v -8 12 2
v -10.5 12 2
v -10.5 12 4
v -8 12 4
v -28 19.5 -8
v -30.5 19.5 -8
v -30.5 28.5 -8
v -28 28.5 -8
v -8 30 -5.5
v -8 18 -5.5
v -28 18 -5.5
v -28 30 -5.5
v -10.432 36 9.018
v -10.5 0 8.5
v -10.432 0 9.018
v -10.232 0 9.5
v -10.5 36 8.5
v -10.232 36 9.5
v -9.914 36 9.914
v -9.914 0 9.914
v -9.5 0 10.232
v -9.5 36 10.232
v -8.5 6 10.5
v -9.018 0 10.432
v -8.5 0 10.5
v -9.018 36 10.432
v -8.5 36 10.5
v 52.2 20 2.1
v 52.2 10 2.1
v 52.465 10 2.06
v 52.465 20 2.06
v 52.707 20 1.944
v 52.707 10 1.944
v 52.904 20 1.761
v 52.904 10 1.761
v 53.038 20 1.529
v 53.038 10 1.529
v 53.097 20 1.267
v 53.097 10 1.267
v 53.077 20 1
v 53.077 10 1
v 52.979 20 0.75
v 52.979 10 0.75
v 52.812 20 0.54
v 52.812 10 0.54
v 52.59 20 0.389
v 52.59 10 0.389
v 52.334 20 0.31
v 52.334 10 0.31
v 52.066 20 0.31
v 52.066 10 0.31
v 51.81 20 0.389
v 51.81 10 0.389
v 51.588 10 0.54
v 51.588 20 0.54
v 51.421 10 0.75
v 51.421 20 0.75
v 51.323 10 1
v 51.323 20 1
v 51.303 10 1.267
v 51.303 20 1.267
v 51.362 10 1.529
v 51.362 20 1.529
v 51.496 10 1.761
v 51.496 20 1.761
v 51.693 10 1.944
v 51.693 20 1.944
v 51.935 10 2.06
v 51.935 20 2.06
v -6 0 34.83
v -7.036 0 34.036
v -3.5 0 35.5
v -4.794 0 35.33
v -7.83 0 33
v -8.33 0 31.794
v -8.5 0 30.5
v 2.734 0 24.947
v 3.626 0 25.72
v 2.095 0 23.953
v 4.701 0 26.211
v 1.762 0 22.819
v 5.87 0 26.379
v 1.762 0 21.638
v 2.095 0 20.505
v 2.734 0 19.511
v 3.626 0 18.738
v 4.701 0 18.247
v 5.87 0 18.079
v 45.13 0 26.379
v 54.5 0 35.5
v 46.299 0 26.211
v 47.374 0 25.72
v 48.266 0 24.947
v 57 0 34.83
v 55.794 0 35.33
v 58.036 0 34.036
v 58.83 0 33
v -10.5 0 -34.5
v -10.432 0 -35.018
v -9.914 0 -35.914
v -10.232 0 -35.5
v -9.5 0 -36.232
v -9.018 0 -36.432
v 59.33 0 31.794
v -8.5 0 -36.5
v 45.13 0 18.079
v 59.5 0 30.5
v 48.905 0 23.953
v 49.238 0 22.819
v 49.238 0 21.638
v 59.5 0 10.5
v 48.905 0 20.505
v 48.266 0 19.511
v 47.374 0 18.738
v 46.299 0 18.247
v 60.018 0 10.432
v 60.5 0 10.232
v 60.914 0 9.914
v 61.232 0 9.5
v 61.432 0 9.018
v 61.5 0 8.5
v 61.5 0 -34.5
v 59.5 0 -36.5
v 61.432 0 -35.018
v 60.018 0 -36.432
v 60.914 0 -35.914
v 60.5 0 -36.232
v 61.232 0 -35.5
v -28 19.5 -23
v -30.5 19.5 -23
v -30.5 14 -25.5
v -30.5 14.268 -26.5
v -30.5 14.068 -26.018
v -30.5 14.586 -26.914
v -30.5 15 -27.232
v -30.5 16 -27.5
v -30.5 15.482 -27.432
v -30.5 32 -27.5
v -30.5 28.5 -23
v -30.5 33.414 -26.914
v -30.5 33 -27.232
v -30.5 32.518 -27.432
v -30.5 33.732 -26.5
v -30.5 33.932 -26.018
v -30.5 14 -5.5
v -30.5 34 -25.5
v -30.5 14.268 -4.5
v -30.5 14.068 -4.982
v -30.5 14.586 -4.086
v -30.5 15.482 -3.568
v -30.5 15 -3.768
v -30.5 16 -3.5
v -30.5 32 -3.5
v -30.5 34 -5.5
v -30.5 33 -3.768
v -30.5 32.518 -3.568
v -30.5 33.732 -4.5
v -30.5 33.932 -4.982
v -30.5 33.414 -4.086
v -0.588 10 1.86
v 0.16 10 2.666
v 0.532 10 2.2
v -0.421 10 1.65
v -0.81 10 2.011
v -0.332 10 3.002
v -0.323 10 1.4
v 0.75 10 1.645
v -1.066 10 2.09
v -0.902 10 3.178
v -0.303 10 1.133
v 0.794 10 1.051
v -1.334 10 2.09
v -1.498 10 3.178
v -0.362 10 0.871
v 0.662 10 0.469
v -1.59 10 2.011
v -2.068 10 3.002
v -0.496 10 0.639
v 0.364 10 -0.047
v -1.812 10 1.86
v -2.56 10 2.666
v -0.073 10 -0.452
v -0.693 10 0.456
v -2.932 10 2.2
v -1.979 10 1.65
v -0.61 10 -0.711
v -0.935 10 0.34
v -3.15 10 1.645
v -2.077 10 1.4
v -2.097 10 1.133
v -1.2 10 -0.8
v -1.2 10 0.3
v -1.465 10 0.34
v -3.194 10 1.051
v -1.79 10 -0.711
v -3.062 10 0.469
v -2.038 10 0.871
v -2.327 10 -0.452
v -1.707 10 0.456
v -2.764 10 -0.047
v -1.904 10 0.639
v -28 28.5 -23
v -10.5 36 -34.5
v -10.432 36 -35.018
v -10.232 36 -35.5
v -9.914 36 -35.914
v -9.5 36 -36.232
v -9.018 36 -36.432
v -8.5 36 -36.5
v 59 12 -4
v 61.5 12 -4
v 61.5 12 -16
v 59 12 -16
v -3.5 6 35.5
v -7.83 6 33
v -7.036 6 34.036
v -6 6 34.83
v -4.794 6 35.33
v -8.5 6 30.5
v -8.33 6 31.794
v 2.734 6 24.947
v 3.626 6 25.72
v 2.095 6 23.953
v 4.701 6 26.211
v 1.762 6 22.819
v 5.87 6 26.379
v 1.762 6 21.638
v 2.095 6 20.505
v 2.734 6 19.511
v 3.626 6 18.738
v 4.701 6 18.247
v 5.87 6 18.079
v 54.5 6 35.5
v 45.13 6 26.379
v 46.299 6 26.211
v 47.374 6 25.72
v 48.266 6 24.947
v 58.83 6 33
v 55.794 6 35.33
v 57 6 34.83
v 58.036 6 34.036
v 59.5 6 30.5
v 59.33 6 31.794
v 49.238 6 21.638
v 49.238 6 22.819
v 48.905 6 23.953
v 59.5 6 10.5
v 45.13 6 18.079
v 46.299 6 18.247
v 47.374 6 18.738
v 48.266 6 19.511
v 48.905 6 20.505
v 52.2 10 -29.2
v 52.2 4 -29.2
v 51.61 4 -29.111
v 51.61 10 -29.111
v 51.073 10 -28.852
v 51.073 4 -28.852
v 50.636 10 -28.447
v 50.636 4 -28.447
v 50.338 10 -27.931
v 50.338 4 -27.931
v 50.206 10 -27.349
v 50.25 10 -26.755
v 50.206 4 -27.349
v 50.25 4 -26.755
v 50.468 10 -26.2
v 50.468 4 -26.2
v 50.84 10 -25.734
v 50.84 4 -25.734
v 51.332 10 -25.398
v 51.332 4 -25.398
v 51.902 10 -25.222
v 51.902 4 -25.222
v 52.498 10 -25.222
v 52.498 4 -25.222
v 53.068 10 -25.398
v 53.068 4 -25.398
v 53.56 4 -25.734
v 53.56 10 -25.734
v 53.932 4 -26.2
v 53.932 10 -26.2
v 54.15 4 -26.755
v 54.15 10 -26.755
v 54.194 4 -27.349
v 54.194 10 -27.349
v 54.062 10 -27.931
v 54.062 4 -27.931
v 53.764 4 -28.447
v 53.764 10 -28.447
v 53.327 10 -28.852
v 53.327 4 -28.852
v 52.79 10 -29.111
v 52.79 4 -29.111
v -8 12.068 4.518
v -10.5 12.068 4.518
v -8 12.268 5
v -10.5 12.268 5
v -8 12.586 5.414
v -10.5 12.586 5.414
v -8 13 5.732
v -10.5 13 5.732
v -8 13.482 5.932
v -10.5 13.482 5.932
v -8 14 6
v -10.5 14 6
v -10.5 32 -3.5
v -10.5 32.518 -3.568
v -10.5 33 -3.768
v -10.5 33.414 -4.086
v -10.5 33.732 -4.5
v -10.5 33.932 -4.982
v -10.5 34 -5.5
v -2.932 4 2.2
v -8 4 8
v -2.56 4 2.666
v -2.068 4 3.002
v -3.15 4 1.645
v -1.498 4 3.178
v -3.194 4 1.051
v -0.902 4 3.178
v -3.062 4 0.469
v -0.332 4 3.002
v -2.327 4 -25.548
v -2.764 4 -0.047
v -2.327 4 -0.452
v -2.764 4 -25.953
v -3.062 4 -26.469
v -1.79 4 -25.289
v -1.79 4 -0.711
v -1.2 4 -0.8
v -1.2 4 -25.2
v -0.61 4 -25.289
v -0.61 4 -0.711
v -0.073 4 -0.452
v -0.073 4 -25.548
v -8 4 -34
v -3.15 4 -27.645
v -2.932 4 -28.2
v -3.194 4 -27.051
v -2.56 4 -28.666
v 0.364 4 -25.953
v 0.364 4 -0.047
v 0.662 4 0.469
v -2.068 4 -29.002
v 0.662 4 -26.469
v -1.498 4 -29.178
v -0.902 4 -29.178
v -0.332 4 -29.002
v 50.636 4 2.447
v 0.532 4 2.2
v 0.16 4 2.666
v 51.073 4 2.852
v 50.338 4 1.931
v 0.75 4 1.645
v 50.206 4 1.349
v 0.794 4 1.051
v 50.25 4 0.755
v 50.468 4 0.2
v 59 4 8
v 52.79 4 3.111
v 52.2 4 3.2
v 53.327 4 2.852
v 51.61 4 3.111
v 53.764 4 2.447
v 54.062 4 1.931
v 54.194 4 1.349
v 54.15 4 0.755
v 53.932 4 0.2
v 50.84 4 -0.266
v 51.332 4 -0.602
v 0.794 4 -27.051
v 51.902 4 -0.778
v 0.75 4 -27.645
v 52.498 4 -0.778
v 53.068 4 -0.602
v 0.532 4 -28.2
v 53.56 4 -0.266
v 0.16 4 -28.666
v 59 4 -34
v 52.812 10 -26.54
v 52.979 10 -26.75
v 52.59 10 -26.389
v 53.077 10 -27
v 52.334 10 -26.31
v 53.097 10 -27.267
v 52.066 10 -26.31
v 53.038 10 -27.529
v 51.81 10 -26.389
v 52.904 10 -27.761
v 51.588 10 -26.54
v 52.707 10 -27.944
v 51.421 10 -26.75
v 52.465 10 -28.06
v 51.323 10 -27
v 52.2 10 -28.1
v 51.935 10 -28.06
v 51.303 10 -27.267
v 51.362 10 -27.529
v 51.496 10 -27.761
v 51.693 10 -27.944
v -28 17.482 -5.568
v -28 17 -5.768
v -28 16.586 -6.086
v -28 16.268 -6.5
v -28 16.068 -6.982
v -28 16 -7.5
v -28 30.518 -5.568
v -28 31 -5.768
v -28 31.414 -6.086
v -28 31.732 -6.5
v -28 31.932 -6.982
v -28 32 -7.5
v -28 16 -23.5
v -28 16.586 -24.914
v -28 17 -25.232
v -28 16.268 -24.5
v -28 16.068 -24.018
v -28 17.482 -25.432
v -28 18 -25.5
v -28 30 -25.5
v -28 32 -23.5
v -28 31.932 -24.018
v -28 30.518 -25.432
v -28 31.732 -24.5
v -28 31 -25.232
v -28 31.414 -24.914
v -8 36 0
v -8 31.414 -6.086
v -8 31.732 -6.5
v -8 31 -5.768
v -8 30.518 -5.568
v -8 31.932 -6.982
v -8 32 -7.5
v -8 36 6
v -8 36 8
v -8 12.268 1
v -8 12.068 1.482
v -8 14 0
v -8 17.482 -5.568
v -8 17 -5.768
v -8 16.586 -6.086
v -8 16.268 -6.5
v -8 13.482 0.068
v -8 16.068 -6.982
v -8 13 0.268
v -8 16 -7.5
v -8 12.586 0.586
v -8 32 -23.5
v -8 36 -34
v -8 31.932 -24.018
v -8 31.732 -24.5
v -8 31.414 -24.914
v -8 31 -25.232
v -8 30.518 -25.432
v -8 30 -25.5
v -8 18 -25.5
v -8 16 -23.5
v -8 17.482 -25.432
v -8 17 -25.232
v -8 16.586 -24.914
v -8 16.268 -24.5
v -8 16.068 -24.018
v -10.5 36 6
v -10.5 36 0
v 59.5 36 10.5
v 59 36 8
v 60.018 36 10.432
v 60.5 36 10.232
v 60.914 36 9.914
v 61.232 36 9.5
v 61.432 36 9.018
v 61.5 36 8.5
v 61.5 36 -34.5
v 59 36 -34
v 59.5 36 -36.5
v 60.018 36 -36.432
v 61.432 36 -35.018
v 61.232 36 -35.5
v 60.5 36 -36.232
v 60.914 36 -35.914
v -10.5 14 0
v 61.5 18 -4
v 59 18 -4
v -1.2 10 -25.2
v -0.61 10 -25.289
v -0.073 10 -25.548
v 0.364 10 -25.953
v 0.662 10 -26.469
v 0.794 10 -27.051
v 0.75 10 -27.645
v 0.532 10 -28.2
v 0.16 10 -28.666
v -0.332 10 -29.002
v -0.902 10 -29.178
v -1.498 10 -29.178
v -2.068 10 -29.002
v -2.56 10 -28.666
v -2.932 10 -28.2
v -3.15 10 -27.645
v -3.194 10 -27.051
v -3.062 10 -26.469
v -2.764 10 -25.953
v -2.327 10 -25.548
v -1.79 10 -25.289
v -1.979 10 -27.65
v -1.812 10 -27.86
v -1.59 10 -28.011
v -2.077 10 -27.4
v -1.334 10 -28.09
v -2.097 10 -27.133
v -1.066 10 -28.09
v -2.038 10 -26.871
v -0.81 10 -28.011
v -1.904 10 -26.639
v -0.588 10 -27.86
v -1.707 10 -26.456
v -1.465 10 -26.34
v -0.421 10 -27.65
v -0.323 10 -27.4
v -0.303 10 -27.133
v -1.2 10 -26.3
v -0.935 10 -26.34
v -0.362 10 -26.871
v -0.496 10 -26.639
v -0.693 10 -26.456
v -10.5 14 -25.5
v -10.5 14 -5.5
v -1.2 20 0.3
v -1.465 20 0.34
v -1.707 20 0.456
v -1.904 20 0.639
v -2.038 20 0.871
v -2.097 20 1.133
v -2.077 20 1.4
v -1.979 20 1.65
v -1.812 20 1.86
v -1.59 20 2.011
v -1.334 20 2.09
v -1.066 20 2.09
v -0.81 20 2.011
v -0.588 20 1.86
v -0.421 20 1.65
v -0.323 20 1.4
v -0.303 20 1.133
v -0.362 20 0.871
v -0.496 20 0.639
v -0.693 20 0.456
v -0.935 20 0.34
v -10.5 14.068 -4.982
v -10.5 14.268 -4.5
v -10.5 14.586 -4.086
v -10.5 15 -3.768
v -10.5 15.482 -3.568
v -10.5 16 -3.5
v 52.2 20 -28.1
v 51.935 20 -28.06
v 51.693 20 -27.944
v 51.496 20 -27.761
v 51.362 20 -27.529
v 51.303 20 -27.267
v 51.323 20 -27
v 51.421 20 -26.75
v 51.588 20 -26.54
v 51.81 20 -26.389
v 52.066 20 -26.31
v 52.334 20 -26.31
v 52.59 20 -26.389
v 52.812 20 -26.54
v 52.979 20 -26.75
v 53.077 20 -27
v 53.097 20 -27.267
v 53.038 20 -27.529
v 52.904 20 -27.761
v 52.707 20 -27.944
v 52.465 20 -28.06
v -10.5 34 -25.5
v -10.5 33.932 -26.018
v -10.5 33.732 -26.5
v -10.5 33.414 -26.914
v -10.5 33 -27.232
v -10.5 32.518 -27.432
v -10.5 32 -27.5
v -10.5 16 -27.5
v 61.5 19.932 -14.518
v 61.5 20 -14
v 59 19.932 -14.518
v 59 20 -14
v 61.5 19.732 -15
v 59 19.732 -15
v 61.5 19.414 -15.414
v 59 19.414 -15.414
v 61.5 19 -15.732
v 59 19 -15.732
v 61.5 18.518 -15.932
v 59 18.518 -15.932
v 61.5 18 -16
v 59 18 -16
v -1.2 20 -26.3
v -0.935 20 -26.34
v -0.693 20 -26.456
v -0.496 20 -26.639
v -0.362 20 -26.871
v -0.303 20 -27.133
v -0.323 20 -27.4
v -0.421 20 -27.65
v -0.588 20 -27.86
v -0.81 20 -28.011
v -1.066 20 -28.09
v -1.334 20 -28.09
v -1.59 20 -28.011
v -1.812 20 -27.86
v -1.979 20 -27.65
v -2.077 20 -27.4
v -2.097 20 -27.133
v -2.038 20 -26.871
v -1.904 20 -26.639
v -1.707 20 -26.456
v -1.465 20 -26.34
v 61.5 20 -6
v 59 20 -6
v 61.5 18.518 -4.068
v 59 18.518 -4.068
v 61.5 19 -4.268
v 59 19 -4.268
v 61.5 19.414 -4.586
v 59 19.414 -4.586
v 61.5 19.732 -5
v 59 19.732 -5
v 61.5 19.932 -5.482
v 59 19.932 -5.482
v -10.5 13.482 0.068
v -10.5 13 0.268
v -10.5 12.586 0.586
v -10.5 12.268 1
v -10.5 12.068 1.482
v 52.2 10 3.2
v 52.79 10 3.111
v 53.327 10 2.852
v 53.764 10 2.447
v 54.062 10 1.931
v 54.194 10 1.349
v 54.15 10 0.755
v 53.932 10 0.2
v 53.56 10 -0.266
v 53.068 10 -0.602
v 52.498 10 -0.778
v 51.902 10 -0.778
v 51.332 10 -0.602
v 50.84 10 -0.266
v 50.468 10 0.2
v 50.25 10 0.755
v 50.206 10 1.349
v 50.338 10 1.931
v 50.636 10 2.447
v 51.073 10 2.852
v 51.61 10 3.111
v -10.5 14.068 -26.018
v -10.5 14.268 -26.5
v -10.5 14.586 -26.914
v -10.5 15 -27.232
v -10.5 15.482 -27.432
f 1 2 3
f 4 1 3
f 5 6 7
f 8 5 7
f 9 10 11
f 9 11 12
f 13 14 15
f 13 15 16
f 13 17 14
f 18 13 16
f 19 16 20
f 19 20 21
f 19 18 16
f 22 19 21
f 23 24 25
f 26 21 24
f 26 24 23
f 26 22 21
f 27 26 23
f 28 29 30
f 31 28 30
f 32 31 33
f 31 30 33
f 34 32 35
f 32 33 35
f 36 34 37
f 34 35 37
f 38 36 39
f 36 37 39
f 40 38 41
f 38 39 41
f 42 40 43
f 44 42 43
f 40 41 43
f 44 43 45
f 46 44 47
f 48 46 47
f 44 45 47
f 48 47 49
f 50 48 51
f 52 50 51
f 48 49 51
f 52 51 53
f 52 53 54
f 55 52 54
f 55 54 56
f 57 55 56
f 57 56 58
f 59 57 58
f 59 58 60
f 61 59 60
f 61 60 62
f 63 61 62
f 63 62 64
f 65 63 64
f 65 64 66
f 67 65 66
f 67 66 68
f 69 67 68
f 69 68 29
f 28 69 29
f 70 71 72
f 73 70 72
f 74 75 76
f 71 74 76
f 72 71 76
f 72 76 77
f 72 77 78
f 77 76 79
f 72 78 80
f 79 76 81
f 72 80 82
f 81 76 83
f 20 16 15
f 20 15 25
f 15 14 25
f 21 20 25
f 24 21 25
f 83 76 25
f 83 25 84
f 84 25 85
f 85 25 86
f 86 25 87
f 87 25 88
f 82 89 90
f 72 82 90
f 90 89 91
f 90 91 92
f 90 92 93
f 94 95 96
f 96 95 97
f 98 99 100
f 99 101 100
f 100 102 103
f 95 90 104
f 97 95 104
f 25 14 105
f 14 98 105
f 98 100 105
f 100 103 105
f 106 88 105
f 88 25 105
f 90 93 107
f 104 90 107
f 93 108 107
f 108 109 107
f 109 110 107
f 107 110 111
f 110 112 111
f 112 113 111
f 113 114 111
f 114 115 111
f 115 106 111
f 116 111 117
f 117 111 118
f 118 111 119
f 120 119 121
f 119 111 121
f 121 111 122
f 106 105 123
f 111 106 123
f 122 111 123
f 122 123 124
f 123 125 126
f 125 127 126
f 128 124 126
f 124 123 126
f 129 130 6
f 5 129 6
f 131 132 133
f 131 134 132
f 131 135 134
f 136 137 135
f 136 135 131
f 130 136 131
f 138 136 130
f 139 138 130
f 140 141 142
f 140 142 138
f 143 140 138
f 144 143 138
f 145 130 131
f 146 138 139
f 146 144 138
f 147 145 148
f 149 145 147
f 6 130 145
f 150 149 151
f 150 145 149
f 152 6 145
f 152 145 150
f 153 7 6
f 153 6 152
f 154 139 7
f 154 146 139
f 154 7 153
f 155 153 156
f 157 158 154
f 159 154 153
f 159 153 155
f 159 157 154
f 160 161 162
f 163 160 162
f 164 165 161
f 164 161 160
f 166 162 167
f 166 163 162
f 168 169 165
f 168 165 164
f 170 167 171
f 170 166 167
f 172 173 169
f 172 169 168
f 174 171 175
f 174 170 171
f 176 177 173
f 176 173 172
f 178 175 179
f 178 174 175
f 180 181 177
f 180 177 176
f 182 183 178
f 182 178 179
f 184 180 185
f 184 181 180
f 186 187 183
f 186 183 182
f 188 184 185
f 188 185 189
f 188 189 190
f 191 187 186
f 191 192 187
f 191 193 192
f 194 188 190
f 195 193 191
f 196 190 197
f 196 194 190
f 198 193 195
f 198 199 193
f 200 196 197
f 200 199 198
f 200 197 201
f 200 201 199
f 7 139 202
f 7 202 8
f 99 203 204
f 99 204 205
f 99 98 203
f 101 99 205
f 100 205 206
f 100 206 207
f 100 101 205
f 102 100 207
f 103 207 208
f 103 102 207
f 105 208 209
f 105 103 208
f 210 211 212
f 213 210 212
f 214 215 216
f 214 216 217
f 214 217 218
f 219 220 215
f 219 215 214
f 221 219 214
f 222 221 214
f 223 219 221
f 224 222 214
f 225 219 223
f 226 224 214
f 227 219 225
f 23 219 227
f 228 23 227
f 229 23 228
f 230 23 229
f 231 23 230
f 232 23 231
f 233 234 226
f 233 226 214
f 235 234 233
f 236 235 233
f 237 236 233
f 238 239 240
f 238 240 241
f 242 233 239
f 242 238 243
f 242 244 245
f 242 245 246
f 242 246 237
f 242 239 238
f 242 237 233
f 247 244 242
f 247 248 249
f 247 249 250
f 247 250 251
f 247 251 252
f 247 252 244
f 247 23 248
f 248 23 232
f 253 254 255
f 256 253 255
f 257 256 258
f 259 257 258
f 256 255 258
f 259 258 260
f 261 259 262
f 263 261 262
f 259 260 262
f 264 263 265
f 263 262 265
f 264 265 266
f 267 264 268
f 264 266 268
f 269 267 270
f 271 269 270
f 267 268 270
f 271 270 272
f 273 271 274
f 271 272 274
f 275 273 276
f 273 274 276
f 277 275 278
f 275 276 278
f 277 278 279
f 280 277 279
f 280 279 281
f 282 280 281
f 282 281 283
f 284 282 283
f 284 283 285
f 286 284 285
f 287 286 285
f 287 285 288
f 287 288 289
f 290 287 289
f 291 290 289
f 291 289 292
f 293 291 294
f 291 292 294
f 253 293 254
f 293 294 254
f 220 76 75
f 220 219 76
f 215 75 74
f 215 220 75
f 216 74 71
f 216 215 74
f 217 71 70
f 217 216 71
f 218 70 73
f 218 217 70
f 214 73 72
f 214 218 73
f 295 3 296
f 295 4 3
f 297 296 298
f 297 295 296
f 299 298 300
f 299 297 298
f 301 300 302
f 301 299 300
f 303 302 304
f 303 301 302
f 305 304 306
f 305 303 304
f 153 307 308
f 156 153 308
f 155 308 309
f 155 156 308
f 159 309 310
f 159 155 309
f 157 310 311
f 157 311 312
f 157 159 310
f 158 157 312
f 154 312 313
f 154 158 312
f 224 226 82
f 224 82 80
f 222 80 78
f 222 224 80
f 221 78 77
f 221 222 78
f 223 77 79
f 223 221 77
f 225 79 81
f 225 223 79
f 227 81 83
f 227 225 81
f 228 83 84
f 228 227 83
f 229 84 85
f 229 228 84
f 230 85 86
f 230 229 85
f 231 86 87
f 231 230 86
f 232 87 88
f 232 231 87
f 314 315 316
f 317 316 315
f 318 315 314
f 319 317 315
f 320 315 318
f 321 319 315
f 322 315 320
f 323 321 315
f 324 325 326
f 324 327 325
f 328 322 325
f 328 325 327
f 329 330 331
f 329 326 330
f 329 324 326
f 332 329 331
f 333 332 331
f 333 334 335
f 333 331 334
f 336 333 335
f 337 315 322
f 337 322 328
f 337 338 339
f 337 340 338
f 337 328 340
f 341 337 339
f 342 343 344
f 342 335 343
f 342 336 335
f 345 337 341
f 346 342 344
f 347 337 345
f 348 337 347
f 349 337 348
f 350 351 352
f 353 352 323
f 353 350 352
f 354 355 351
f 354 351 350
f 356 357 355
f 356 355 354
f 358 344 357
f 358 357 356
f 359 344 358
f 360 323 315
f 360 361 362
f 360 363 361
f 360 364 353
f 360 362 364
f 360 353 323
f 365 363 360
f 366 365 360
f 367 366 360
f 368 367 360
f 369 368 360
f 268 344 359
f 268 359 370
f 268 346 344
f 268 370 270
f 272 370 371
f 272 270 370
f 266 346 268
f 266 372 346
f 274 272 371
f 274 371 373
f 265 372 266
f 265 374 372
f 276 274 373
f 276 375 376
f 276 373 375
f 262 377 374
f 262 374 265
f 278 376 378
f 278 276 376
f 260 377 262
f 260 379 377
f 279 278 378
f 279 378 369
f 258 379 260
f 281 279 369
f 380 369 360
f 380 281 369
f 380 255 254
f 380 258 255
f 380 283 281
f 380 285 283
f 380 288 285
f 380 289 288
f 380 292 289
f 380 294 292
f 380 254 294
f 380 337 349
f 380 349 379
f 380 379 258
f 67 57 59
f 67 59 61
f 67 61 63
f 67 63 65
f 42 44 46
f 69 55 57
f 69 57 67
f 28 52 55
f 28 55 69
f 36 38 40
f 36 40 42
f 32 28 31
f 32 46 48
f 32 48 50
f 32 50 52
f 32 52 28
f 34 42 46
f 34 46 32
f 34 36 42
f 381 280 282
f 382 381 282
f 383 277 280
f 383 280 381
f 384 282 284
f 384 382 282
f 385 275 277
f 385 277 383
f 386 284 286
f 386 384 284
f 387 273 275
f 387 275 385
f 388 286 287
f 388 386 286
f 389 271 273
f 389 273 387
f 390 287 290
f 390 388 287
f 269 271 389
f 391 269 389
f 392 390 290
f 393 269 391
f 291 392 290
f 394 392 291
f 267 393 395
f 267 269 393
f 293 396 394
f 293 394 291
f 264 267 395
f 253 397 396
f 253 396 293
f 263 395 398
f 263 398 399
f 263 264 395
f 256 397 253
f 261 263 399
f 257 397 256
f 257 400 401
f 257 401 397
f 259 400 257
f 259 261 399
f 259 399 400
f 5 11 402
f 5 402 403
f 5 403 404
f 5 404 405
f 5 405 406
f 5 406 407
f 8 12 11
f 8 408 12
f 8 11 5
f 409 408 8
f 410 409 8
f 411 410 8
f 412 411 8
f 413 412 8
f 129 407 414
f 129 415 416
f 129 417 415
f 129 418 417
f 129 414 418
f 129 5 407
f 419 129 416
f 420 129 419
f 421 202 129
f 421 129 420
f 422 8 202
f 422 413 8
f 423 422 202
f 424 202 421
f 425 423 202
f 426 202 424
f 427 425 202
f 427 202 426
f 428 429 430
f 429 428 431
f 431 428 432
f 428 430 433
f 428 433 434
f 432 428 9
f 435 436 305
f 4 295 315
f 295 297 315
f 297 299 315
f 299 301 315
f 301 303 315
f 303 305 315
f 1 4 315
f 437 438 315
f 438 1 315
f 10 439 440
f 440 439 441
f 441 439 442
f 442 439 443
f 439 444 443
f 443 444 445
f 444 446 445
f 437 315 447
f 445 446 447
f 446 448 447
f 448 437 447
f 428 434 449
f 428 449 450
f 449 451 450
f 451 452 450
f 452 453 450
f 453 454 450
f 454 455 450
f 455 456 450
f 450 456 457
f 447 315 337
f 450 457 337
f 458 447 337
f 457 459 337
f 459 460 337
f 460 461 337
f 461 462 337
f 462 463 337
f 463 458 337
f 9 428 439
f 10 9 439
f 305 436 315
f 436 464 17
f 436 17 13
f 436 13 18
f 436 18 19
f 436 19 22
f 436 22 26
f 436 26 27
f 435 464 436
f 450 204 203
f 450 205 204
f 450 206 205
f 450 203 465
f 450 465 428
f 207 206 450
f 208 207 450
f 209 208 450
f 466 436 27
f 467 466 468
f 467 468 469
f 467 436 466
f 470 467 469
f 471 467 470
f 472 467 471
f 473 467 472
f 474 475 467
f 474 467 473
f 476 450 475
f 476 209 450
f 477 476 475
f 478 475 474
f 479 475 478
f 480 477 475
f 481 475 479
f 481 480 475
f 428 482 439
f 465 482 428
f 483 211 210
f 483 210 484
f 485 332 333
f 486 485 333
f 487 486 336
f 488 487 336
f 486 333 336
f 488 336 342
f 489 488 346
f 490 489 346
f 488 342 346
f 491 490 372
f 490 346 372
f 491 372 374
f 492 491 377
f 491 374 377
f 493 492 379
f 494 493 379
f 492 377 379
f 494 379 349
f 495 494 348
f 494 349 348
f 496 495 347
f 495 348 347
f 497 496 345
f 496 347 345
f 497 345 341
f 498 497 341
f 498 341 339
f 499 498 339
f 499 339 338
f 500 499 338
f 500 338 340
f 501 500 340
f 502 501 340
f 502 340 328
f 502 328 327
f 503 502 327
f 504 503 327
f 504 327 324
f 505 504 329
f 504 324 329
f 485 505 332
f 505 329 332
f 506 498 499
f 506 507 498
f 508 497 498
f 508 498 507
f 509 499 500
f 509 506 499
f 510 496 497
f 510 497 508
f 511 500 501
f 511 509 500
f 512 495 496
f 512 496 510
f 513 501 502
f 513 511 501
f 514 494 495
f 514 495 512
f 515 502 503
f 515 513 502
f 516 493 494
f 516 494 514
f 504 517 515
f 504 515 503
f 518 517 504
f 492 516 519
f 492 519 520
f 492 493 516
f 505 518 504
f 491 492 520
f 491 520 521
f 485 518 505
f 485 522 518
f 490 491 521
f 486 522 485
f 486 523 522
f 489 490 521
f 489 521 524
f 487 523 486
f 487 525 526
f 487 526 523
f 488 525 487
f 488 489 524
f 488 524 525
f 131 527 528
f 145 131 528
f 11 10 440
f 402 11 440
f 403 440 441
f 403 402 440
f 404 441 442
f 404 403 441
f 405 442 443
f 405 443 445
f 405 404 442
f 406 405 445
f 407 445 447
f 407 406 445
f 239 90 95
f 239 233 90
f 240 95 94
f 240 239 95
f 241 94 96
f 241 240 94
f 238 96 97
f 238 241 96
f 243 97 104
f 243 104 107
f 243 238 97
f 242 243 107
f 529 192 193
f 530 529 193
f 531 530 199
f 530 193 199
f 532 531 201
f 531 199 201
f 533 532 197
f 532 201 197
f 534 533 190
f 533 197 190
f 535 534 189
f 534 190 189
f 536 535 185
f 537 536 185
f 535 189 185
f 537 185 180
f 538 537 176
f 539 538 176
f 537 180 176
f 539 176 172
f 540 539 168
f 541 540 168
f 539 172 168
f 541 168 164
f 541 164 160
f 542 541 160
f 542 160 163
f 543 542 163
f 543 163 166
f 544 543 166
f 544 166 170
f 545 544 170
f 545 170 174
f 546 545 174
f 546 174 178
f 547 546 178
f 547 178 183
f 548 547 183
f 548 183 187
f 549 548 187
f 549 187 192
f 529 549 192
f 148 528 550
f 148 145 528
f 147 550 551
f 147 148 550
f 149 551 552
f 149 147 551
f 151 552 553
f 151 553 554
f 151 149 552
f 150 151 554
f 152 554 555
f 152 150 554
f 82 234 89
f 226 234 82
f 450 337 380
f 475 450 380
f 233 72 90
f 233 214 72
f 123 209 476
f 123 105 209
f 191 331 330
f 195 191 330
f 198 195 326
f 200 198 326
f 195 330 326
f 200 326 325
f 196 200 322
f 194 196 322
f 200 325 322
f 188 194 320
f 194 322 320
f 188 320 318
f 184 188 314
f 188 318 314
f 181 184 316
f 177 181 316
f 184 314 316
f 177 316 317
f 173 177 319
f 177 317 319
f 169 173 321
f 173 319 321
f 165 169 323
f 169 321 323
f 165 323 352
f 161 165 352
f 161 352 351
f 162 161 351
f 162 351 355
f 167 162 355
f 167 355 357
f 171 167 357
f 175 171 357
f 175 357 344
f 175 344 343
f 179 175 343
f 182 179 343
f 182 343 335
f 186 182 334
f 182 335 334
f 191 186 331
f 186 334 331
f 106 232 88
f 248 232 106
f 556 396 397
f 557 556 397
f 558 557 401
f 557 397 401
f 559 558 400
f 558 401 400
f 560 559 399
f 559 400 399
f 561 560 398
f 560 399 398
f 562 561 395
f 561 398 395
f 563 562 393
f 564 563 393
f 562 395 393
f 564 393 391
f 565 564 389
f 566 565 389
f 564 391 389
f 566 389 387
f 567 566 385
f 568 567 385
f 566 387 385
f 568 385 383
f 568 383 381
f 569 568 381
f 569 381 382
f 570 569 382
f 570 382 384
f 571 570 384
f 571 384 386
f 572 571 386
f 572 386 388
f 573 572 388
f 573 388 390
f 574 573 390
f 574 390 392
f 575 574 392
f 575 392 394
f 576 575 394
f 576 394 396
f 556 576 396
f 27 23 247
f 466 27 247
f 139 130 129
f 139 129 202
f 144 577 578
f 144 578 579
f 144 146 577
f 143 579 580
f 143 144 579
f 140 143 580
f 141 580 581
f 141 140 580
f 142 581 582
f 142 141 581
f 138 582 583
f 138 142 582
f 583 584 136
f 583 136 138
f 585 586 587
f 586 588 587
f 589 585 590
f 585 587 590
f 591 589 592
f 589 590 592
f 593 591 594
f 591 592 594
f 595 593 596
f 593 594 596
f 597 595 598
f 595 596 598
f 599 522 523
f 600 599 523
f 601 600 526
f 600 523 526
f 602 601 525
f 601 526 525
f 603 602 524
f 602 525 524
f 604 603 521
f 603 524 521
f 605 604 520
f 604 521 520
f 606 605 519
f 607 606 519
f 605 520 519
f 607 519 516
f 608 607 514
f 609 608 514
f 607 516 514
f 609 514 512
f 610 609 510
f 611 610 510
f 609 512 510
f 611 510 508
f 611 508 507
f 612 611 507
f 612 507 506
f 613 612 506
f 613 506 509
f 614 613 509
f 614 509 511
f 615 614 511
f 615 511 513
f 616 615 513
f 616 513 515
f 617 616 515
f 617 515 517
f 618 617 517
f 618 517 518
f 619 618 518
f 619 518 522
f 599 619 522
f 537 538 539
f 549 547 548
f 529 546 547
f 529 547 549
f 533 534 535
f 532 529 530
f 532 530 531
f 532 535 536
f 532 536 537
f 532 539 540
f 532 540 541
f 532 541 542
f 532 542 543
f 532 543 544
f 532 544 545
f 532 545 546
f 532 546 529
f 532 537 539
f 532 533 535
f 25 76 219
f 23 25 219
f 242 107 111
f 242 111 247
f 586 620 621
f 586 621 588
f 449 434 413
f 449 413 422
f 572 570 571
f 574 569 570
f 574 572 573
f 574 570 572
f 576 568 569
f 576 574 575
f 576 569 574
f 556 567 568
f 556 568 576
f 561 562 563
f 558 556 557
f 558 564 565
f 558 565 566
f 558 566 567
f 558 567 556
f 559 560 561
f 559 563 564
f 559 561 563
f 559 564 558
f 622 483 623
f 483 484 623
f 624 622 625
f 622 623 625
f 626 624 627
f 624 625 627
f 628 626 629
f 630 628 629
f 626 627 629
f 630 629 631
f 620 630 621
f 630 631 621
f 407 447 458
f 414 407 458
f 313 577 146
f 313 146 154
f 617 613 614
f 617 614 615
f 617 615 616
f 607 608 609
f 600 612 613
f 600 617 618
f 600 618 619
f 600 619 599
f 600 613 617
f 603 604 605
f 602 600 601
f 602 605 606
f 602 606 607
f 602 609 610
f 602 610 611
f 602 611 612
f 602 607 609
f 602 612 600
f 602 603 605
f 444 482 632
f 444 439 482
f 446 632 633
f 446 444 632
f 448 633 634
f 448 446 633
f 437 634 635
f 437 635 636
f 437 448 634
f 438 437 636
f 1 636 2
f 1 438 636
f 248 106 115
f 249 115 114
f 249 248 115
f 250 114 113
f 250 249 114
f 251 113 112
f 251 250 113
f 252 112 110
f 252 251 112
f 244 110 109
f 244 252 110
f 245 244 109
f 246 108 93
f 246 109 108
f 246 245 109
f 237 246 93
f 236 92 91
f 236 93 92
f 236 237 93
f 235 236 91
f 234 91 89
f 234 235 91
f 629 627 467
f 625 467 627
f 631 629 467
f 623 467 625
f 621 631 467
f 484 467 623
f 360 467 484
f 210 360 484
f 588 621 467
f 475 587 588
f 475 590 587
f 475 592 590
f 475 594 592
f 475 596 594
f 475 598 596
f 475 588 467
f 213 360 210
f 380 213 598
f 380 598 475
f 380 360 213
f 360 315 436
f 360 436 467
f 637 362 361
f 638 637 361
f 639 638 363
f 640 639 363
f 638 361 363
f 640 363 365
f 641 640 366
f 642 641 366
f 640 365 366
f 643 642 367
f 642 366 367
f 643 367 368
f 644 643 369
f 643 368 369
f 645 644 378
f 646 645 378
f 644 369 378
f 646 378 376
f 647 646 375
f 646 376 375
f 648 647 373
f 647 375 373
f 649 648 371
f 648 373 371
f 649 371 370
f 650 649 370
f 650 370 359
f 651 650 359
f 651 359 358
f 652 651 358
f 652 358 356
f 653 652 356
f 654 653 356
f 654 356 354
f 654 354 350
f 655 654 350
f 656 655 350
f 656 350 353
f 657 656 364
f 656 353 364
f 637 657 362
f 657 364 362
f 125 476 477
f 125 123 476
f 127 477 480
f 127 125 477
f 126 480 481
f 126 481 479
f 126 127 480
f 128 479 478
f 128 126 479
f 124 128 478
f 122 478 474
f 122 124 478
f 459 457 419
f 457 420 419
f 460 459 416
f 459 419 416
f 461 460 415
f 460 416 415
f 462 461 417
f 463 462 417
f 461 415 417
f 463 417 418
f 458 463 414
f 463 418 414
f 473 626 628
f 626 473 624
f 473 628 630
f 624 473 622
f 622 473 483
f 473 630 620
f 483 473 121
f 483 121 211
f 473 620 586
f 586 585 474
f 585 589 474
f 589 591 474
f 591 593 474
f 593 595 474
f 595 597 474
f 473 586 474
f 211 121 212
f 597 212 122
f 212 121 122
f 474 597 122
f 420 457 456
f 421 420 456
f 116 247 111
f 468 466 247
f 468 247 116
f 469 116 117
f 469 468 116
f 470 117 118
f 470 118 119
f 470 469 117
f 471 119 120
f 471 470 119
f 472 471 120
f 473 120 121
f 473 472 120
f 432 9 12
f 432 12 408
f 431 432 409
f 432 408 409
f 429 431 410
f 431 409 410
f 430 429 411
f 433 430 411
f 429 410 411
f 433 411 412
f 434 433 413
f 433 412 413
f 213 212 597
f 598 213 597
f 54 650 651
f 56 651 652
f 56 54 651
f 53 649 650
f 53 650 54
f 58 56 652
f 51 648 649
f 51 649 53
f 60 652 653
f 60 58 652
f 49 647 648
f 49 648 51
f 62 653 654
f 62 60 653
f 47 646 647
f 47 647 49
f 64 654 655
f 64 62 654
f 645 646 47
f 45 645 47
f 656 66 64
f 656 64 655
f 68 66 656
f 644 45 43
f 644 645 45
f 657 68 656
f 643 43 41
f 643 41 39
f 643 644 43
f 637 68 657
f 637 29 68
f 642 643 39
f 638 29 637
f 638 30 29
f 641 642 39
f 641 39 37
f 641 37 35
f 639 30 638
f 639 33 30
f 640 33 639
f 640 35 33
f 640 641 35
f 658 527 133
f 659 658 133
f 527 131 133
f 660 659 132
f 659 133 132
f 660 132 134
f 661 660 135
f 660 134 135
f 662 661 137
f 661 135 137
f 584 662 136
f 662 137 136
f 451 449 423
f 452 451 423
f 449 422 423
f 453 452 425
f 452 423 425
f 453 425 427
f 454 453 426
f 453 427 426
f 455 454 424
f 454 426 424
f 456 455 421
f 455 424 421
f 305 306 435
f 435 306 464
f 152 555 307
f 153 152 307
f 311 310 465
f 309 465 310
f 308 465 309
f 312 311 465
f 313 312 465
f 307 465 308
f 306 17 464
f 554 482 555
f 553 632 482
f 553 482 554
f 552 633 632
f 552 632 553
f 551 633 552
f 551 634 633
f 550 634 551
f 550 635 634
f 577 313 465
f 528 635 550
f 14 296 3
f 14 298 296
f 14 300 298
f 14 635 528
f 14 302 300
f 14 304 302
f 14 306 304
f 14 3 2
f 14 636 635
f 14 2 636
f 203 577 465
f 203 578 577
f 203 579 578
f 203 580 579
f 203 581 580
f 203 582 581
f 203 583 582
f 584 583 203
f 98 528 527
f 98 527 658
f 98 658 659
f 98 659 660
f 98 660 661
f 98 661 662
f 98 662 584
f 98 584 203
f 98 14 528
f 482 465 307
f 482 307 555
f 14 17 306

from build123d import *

# Parameters (mm, degrees)
SKETCH1_W           = 72
SKETCH1_H           = 47
BOSS_EXTRUDE1_DEPTH = 4
SKETCH3_W           = 72
SKETCH3_H           = 47
SKETCH3_W_2         = 67
SKETCH3_H_2         = 42
BOSS_EXTRUDE3_DEPTH = 32
SKETCH2_R           = 0.9
BOSS_EXTRUDE4_DEPTH = 16
SKETCH4_R           = 2
BOSS_EXTRUDE5_DEPTH = 6
SKETCH5_W           = 12
SKETCH5_H           = 8
CUT_EXTRUDE1_DEPTH  = 6
FILLET2_R           = 2
FILLET3_R           = 2
SKETCH11_W          = 24
SKETCH11_H          = 20
BOSS_EXTRUDE7_DEPTH = 20
SKETCH12_W          = 20
SKETCH12_H          = 16
CUT_EXTRUDE4_DEPTH  = 20
SKETCH13_W          = 15
SKETCH13_H          = 9
CUT_EXTRUDE5_DEPTH  = 20
FILLET4_R           = 2
FILLET5_R           = 2
SKETCH14_W          = 6
SKETCH14_H          = 25
CUT_EXTRUDE6_DEPTH  = 5
FILLET6_R           = 2
SKETCH15_W          = 68
SKETCH15_H          = 6
BOSS_EXTRUDE8_DEPTH = 25
FILLET7_R           = 5
CUT_EXTRUDE7_DEPTH  = 25


with BuildPart() as part:
    # Sketch1 → Boss-Extrude1 (new body)
    with BuildSketch(Plane(origin=(0, 0, 0), x_dir=(1, 0, 0), z_dir=(0, 1, 0))):
        with Locations((25.5, 13)):
            Rectangle(SKETCH1_W, SKETCH1_H)
    extrude(amount=BOSS_EXTRUDE1_DEPTH)

    # Sketch3 → Boss-Extrude3 (add)
    with BuildSketch(Plane(origin=(0, 4, 0), x_dir=(1, 0, 0), z_dir=(0, 1, 0))):
        with Locations((25.5, 13)):
            Rectangle(SKETCH3_W, SKETCH3_H)
        with Locations((25.5, 13)):
            Rectangle(SKETCH3_W_2, SKETCH3_H_2, mode=Mode.SUBTRACT)
    extrude(amount=BOSS_EXTRUDE3_DEPTH)

    # Sketch2 → Boss-Extrude4 (add)
    with BuildSketch(Plane(origin=(0, 4, 0), x_dir=(1, 0, 0), z_dir=(0, 1, 0))):
        with Locations(Location((-1.2, 27.2, 0), (0, 0, 270))):
            Circle(SKETCH2_R)
        with Locations(Location((-1.2, -1.2, 0), (0, 0, 90))):
            Circle(SKETCH2_R)
        with Locations(Location((52.2, -1.2, 0), (0, 0, 270))):
            Circle(SKETCH2_R)
        with Locations(Location((52.2, 27.2, 0), (0, 0, 90))):
            Circle(SKETCH2_R)
    extrude(amount=BOSS_EXTRUDE4_DEPTH)

    # Sketch4 → Boss-Extrude5 (add)
    with BuildSketch(Plane(origin=(0, 4, 0), x_dir=(1, 0, 0), z_dir=(0, 1, 0))):
        with Locations(Location((-1.2, 27.2, 0), (0, 0, 270))):
            Circle(SKETCH4_R)
        with Locations(Location((-1.2, -1.2, 0), (0, 0, 90))):
            Circle(SKETCH4_R)
        with Locations(Location((52.2, -1.2, 0), (0, 0, 270))):
            Circle(SKETCH4_R)
        with Locations(Location((52.2, 27.2, 0), (0, 0, 90))):
            Circle(SKETCH4_R)
    extrude(amount=BOSS_EXTRUDE5_DEPTH)

    # Sketch5 → Cut-Extrude1 (cut)
    with BuildSketch(Plane(origin=(61.5, 0, 0), x_dir=(0, 0, -1), z_dir=(1, 0, 0))):
        with Locations((10, 16)):
            Rectangle(SKETCH5_W, SKETCH5_H)
    extrude(amount=-CUT_EXTRUDE1_DEPTH, mode=Mode.SUBTRACT)

    # Fillet2
    fillet2_edges = [part.edges().sort_by_distance(p)[0] for p in [
        (-10.5, 18, 10.5),
        (-10.5, 18, -36.5),
        (61.5, 18, -36.5),
        (61.5, 18, 10.5),
    ]]
    fillet(fillet2_edges, radius=FILLET2_R)

    # Fillet3
    fillet3_edges = [part.edges().sort_by_distance(p)[0] for p in [
        (60.25, 20, -4),
        (60.25, 20, -16),
    ]]
    fillet(fillet3_edges, radius=FILLET3_R)

    # Sketch11 → Boss-Extrude7 (add)
    with BuildSketch(Plane.ZY.offset(10.5)):
        with Locations((-15.5, 24)):
            Rectangle(SKETCH11_W, SKETCH11_H)
    extrude(amount=BOSS_EXTRUDE7_DEPTH)

    # Sketch12 → Cut-Extrude4 (cut)
    with BuildSketch(Plane(origin=(-8, 0, 0), x_dir=(0, 0, -1), z_dir=(1, 0, 0))):
        with Locations((15.5, 24)):
            Rectangle(SKETCH12_W, SKETCH12_H)
    extrude(amount=-CUT_EXTRUDE4_DEPTH, mode=Mode.SUBTRACT)

    # Sketch13 → Cut-Extrude5 (cut)
    with BuildSketch(Plane.ZY.offset(30.5)):
        with Locations((-15.5, 24)):
            Rectangle(SKETCH13_W, SKETCH13_H)
    extrude(amount=-CUT_EXTRUDE5_DEPTH, mode=Mode.SUBTRACT)

    # Fillet4
    fillet4_edges = [part.edges().sort_by_distance(p)[0] for p in [
        (-18, 16, -25.5),
        (-18, 16, -5.5),
        (-18, 32, -5.5),
        (-18, 32, -25.5),
    ]]
    fillet(fillet4_edges, radius=FILLET4_R)

    # Fillet5
    fillet5_edges = [part.edges().sort_by_distance(p)[0] for p in [
        (-20.5, 34, -27.5),
        (-20.5, 14, -27.5),
        (-20.5, 14, -3.5),
        (-20.5, 34, -3.5),
    ]]
    fillet(fillet5_edges, radius=FILLET5_R)

    # Sketch14 → Cut-Extrude6 (cut)
    with BuildSketch(Plane.ZY.offset(10.5)):
        with Locations((3, 24.5)):
            Rectangle(SKETCH14_W, SKETCH14_H)
    extrude(amount=-CUT_EXTRUDE6_DEPTH, mode=Mode.SUBTRACT)

    # Fillet6
    fillet6_edges = [part.edges().sort_by_distance(p)[0] for p in [
        (-9.25, 12, 0),
        (-9.25, 12, 6),
    ]]
    fillet(fillet6_edges, radius=FILLET6_R)

    # Sketch15 → Boss-Extrude8 (add)
    with BuildSketch(Plane.XY.offset(10.5)):
        with Locations((25.5, 3)):
            Rectangle(SKETCH15_W, SKETCH15_H)
    extrude(amount=BOSS_EXTRUDE8_DEPTH)

    # Fillet7
    fillet7_edges = [part.edges().sort_by_distance(p)[0] for p in [
        (-8.5, 3, 35.5),
        (59.5, 3, 35.5),
    ]]
    fillet(fillet7_edges, radius=FILLET7_R)

    # Sketch16 → Cut-Extrude7 (cut)
    with BuildSketch(Plane(origin=(0, 6, 0), x_dir=(1, 0, 0), z_dir=(0, 1, 0))):
        with BuildLine():
            Line((5.870048695, -18.078882232), (45.129951305, -18.078882232))
            ThreePointArc((45.129951305, -18.078882232), (49.279951305, -22.228882232), (45.129951305, -26.378882232))
            Line((45.129951305, -26.378882232), (5.870048695, -26.378882232))
            ThreePointArc((5.870048695, -26.378882232), (1.720048695, -22.228882232), (5.870048695, -18.078882232))
        make_face()
    extrude(amount=-CUT_EXTRUDE7_DEPTH, mode=Mode.SUBTRACT)


solid = part.part
